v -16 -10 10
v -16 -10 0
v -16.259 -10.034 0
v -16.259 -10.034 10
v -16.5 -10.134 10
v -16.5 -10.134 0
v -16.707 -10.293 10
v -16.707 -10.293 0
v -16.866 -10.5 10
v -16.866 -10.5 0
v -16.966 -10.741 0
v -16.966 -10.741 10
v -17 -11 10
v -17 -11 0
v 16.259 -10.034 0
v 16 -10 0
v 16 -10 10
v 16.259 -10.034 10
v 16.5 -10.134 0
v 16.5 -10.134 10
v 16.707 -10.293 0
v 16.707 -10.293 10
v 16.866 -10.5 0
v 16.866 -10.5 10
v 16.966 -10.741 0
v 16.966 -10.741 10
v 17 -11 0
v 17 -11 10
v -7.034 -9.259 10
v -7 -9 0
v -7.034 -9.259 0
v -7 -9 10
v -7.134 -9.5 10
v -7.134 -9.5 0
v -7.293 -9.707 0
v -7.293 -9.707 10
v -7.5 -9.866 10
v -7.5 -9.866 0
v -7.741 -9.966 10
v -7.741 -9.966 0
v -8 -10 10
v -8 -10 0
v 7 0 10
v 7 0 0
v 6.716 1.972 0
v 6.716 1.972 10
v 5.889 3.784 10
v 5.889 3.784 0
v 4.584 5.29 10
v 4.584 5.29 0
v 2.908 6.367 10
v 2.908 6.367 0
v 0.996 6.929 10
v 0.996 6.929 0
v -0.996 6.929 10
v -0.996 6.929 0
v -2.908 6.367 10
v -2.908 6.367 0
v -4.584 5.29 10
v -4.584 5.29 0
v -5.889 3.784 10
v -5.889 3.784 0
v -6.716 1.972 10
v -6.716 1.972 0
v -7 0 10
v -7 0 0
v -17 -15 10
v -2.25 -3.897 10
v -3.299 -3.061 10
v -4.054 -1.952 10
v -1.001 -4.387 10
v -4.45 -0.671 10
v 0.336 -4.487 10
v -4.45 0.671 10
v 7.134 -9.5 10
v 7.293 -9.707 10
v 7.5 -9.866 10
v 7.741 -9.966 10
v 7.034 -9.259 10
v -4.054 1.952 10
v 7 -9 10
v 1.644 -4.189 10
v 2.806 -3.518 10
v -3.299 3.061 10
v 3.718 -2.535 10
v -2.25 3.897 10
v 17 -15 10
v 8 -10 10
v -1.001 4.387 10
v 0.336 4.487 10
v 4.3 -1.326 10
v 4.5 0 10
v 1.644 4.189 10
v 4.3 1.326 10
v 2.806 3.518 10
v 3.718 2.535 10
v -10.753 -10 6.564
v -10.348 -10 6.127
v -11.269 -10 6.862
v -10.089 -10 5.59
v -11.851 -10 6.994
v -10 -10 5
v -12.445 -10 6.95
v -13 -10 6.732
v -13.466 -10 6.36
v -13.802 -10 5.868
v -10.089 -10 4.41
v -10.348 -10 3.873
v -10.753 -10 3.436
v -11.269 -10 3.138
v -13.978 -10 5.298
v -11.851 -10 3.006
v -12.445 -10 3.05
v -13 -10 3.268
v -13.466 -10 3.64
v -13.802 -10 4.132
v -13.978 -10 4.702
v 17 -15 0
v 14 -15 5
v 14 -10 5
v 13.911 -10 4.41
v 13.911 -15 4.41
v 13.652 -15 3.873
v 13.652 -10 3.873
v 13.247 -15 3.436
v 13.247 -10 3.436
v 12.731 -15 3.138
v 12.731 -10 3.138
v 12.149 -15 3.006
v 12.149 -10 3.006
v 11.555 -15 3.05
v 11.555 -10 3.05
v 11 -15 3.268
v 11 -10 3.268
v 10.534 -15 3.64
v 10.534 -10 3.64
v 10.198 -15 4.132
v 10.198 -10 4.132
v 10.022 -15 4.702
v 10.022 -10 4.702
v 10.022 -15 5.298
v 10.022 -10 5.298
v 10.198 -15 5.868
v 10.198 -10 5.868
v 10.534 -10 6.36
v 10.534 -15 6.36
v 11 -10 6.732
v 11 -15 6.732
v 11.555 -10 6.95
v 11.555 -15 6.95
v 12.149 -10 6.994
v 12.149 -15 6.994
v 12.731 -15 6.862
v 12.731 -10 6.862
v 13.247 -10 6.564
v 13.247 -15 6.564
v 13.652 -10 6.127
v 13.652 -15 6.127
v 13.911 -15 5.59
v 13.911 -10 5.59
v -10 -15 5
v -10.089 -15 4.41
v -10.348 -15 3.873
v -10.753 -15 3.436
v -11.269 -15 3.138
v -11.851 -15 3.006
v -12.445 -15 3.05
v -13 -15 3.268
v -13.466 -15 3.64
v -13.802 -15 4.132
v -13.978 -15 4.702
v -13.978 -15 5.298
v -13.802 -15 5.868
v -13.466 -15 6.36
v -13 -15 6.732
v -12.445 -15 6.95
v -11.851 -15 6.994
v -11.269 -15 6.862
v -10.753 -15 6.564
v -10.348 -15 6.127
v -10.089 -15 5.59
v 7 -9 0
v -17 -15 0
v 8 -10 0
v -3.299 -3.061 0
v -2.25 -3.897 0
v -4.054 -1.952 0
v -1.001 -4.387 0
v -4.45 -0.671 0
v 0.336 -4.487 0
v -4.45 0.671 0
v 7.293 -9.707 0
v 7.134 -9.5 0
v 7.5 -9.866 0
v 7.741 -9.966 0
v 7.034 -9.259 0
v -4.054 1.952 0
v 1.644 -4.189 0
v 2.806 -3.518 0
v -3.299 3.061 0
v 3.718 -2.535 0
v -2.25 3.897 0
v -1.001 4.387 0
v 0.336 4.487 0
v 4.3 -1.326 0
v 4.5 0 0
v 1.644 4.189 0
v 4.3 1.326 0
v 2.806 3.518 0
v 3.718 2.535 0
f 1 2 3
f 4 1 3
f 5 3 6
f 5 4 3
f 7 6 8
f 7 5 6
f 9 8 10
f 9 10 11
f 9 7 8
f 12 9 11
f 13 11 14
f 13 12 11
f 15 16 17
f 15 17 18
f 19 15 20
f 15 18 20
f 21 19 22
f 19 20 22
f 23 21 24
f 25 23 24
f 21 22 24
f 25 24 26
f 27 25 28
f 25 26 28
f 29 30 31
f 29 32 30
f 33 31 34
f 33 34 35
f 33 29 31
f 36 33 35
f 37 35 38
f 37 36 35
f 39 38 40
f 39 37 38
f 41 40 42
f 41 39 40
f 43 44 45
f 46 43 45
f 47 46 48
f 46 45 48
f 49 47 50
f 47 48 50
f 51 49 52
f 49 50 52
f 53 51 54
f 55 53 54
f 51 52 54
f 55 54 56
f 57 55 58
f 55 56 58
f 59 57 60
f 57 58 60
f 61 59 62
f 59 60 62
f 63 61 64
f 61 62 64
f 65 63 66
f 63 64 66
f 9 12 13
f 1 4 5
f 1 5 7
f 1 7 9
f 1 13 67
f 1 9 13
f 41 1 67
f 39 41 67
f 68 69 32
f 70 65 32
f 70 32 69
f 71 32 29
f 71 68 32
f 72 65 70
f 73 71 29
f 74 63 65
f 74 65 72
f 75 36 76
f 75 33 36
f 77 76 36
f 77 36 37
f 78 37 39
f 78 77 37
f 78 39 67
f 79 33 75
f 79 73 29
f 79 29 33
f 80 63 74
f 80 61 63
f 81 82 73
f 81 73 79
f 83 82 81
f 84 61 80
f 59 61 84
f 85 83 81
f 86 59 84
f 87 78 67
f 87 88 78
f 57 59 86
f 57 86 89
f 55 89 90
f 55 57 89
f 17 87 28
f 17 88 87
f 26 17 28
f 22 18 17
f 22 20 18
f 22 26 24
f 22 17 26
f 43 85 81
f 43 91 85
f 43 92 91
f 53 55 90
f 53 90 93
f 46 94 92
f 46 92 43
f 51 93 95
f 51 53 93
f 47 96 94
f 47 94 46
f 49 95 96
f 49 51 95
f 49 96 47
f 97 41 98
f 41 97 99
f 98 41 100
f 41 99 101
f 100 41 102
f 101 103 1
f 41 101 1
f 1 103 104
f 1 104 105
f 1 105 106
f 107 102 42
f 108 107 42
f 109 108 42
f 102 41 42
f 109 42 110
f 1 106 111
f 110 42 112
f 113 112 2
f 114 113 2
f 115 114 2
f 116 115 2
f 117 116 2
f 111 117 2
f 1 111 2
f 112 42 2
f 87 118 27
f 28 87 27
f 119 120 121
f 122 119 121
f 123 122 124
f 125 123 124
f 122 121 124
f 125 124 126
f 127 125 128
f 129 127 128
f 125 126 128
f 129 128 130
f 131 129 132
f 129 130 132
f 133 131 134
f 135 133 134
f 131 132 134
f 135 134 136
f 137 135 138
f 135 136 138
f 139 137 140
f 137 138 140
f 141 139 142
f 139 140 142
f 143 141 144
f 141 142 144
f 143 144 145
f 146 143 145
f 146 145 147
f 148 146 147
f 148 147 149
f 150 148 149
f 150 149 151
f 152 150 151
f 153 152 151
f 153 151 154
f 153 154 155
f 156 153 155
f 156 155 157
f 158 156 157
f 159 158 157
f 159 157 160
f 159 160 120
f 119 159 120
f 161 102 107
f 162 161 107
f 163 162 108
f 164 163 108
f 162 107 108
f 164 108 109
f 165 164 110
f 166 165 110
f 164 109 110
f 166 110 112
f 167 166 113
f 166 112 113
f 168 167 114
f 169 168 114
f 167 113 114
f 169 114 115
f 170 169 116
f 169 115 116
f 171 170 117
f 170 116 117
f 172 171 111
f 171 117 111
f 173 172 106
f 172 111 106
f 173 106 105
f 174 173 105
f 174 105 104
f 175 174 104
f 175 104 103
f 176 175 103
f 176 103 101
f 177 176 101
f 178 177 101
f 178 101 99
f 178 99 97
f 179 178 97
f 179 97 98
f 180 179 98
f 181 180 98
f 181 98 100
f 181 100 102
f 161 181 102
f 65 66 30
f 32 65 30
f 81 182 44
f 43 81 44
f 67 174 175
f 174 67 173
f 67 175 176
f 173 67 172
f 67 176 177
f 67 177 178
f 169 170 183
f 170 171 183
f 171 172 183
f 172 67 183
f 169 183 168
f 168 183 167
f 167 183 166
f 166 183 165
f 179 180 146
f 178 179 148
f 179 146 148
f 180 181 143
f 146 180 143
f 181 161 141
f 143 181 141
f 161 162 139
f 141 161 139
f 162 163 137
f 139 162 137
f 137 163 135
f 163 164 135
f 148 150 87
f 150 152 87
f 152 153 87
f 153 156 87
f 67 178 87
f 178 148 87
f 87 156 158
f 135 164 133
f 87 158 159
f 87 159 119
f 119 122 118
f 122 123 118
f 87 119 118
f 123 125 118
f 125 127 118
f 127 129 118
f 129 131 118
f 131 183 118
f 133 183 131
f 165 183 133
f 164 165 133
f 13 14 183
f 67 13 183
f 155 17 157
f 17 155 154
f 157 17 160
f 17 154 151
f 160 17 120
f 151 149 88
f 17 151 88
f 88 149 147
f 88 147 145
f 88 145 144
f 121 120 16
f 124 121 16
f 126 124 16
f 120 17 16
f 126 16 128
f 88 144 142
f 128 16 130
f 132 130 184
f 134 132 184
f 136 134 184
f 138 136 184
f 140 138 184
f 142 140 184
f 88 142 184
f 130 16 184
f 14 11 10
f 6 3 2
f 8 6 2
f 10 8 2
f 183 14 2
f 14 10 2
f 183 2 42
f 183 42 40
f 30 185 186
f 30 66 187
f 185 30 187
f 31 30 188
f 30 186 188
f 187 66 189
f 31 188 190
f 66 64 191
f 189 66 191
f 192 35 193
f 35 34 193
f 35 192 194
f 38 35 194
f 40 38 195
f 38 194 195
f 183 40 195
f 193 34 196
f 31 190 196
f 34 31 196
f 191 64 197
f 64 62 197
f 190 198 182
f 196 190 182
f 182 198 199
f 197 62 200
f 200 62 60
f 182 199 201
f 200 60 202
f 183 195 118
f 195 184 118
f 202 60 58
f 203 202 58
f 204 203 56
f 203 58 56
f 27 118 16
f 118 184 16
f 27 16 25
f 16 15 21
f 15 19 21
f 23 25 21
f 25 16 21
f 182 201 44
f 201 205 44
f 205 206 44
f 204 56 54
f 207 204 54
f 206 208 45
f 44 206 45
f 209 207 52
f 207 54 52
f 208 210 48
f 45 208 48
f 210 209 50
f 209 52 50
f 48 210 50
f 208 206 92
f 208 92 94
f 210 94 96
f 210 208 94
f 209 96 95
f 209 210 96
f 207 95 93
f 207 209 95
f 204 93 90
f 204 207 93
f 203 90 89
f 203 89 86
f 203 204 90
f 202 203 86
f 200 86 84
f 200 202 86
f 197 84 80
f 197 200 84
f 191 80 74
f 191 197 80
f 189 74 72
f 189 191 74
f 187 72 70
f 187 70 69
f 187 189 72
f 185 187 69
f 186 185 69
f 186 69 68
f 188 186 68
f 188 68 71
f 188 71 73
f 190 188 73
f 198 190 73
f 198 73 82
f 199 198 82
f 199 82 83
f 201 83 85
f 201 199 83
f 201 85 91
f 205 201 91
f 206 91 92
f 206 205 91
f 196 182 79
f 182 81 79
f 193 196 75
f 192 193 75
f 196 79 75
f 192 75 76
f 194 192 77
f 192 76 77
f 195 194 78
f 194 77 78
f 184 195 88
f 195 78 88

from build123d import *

# Parameters (mm, degrees)
SKETCH_1_R          = 4.5
EXTRUDE_1_DEPTH     = 10
CUT_EXTRUDE_1_REACH = 7
SKETCH_2_R          = 2
FILLET_2_R          = 1


with BuildPart() as part:
    # 草圖1 → 填料-伸長1 (new body)
    with BuildSketch(Plane.XY):
        with BuildLine():
            Line((7, -10), (7, 0))
            ThreePointArc((7, 0), (0, 7), (-7, 0))
            Line((-7, 0), (-7, -10))
            Line((-7, -10), (-17, -10))
            Line((-17, -10), (-17, -15))
            Line((-17, -15), (17, -15))
            Line((17, -15), (17, -10))
            Line((17, -10), (7, -10))
        make_face()
        Circle(SKETCH_1_R, mode=Mode.SUBTRACT)
    extrude(amount=EXTRUDE_1_DEPTH)

    # 草圖2 → 除料-伸長1 (cut, up to next)
    with BuildSketch(Plane(origin=(0, -10, 0), x_dir=(1, 0, 0), z_dir=(0, 1, 0)), mode=Mode.PRIVATE) as cut_extrude_1_sk1:
        with Locations((12, -5)):
            Circle(SKETCH_2_R)
    cut_extrude_1_tool1 = extrude(cut_extrude_1_sk1.sketch, amount=-CUT_EXTRUDE_1_REACH, mode=Mode.PRIVATE) & part.part
    add(cut_extrude_1_tool1.solids().sort_by_distance((12, -10, 5))[0], mode=Mode.SUBTRACT)
    # 草圖2 → 除料-伸長1 (cut, up to next)
    with BuildSketch(Plane(origin=(0, -10, 0), x_dir=(1, 0, 0), z_dir=(0, 1, 0)), mode=Mode.PRIVATE) as cut_extrude_1_sk2:
        with Locations((-12, -5)):
            Circle(SKETCH_2_R)
    cut_extrude_1_tool2 = extrude(cut_extrude_1_sk2.sketch, amount=-CUT_EXTRUDE_1_REACH, mode=Mode.PRIVATE) & part.part
    add(cut_extrude_1_tool2.solids().sort_by_distance((-12, -10, 5))[0], mode=Mode.SUBTRACT)

    # 圓角2
    fillet_2_edges = [part.edges().sort_by_distance(p)[0] for p in [
        (-17, -10, 5),
        (-7, -10, 5),
        (7, -10, 5),
        (17, -10, 5),
    ]]
    fillet(fillet_2_edges, radius=FILLET_2_R)


solid = part.part
